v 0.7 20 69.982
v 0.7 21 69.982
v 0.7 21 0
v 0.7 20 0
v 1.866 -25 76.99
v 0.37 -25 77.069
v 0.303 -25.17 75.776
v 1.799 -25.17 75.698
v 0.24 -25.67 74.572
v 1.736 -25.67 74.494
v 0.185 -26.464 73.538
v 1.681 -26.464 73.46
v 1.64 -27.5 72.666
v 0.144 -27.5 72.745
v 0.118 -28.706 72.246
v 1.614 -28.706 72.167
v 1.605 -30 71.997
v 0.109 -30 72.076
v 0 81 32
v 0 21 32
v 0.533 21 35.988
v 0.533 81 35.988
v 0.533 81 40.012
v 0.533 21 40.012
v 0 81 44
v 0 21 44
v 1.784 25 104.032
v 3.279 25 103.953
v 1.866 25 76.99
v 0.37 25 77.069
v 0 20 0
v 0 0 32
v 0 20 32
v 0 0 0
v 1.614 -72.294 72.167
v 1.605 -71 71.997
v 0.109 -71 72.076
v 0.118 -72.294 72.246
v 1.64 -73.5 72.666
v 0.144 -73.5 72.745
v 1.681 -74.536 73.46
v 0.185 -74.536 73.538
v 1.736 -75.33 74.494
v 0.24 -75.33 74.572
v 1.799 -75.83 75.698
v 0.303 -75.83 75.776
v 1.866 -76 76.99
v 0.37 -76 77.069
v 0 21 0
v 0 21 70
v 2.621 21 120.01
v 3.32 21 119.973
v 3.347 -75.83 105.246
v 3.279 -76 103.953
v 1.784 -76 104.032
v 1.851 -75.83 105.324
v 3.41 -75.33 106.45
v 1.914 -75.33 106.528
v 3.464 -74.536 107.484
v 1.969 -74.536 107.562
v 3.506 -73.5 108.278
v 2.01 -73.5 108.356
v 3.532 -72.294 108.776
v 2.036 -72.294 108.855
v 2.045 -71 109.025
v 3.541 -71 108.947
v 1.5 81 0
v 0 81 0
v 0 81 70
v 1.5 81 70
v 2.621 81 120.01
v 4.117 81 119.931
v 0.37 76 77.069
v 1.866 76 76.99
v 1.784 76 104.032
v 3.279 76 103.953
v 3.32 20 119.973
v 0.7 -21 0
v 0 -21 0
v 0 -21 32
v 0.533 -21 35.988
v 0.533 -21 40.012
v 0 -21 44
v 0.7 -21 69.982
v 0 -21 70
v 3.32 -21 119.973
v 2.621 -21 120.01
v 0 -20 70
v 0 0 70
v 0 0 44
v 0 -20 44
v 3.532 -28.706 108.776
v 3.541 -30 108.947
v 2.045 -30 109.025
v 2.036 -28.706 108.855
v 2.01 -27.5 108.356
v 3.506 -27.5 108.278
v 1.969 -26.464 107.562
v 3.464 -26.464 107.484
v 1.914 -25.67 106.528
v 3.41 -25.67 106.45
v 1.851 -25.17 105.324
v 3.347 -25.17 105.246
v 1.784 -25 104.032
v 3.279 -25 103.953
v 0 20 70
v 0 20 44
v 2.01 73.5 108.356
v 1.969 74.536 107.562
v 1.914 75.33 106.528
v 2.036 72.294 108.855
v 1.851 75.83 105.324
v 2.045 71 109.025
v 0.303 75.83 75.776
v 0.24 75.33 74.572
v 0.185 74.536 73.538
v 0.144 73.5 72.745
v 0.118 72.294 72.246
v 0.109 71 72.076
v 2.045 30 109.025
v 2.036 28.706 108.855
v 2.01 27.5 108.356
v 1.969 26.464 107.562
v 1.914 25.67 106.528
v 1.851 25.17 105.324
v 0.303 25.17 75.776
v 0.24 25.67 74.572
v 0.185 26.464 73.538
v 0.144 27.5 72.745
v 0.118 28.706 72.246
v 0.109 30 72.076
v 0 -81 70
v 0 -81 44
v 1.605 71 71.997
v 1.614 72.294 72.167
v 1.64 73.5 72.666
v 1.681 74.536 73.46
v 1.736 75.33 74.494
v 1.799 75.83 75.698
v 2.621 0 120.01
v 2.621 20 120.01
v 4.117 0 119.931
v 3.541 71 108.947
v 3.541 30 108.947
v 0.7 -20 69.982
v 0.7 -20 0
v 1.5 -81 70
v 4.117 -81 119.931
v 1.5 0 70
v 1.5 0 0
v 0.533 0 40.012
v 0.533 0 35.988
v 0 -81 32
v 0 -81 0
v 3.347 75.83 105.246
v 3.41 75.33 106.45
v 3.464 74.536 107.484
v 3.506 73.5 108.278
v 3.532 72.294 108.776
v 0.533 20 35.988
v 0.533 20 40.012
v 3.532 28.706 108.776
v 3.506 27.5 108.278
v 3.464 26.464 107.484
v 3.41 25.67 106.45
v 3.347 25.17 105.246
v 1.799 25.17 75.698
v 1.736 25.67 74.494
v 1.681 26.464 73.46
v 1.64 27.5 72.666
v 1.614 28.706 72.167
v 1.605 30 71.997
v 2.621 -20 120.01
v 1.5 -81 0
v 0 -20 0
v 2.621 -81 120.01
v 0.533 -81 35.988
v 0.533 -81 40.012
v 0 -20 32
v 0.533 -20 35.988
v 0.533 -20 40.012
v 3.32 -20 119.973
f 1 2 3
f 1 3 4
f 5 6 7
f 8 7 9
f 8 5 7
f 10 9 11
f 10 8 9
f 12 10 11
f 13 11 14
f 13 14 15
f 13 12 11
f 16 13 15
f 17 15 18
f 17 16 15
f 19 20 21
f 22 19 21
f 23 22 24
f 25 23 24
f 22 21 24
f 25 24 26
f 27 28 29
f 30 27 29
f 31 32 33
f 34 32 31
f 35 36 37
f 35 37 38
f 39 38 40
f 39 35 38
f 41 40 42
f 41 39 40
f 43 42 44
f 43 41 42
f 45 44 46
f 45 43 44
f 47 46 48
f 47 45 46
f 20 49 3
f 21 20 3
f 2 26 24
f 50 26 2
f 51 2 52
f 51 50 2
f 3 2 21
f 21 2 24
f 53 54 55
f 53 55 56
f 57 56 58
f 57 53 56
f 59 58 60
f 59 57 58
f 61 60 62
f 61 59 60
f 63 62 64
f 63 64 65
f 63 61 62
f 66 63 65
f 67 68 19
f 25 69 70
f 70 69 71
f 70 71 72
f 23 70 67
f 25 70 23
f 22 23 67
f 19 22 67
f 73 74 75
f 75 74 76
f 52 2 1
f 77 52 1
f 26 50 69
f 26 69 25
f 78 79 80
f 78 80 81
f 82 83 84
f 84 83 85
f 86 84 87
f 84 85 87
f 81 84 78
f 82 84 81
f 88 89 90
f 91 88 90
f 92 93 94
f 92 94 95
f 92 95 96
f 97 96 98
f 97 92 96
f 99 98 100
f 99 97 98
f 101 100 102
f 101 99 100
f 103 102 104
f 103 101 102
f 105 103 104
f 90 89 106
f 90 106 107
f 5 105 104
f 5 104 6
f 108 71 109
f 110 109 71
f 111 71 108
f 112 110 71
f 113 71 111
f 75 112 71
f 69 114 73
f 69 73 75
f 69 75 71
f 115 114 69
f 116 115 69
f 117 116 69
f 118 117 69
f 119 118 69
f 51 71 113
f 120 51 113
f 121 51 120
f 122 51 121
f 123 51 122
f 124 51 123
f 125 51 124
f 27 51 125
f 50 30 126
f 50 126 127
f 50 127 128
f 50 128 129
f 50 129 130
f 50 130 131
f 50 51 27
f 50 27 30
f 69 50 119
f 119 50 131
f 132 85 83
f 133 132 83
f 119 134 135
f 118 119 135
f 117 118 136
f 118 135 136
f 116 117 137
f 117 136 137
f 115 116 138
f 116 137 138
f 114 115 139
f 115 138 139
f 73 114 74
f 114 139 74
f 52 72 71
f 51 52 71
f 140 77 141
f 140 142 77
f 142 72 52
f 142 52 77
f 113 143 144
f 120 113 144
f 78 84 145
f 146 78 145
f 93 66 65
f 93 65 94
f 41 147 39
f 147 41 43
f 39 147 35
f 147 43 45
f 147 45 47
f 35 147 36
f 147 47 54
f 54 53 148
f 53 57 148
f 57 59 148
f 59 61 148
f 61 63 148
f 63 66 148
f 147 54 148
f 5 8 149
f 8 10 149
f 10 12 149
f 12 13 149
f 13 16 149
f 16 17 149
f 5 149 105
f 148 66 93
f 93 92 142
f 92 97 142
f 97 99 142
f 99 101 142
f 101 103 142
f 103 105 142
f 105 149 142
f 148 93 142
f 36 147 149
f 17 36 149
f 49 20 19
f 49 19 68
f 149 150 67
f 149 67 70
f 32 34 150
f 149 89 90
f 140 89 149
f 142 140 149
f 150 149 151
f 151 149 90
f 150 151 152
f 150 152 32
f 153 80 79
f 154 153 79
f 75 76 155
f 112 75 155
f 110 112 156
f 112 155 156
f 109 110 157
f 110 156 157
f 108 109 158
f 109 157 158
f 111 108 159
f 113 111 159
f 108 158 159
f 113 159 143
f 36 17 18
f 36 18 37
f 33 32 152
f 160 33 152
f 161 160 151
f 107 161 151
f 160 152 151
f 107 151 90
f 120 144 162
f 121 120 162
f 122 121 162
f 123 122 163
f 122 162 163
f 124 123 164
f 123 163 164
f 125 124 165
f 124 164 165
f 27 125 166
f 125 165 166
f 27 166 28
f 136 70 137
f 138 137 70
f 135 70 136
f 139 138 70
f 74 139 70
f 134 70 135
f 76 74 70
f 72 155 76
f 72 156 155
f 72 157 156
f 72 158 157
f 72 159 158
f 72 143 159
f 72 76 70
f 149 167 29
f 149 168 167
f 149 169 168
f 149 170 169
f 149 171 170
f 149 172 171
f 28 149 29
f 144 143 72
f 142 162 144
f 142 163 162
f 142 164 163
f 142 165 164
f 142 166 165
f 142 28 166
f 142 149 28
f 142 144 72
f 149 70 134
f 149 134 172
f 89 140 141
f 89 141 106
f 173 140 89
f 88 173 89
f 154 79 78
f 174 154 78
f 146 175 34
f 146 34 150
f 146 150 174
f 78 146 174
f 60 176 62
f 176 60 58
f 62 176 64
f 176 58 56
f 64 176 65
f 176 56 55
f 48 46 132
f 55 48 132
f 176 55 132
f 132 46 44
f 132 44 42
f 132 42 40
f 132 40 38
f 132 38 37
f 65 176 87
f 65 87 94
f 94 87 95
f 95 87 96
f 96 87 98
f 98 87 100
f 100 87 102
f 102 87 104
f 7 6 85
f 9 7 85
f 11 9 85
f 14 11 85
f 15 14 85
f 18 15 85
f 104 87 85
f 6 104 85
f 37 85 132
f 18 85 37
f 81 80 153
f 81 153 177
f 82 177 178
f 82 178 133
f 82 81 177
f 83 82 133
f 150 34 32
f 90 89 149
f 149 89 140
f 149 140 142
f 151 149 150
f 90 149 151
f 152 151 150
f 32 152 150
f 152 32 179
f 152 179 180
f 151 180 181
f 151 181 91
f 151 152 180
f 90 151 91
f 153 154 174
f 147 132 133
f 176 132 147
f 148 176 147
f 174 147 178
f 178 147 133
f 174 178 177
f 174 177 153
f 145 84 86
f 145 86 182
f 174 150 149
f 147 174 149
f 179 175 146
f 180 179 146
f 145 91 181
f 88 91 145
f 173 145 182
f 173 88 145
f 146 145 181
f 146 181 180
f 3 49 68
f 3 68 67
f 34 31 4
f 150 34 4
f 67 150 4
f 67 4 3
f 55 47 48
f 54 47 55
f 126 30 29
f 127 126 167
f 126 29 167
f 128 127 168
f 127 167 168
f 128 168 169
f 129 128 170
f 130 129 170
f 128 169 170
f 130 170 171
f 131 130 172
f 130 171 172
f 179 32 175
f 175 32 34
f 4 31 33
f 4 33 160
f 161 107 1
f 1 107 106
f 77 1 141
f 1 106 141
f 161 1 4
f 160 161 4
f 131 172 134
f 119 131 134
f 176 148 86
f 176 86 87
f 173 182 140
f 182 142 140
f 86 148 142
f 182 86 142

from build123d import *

# Parameters (mm, degrees)
F1_DEPTH = 81
F3_DEPTH = 4.1162588316
F5_DEPTH = 81.001
F6_W     = 1
F6_H     = 70
F7_DEPTH = 0.7
F8_W     = 1
F8_H     = 50.0785039344
F9_DEPTH = 0.7


with BuildPart() as f1:
    # F0 (on Front) → F1 (new body)
    with BuildSketch(Plane.XZ):
        Polygon((0, 70), (0, 0), (1.5, 0), (1.5, 70), (4.1167978121, 119.9314767377), (2.6209063906, 120.0098730852), align=None)
    extrude(amount=-F1_DEPTH)

    # F2 (on face) → F3 (cut, through all)
    with BuildSketch(Plane(origin=(-2.1626047928, 0, 0.1133373147), x_dir=(0, 1, 0), z_dir=(0.9986295348, 0, -0.0523359562))):
        with BuildLine():
            Line((71, 108.9825713672), (30, 108.9825713672))
            ThreePointArc((30, 108.9825713672), (26.4644660941, 107.5181052731), (25, 103.9825713672))
            Line((25, 103.9825713672), (25, 76.9825713672))
            ThreePointArc((25, 76.9825713672), (26.4644660941, 73.4470374613), (30, 71.9825713672))
            Line((30, 71.9825713672), (71, 71.9825713672))
            ThreePointArc((71, 71.9825713672), (74.5355339059, 73.4470374613), (76, 76.9825713672))
            Line((76, 76.9825713672), (76, 103.9825713672))
            ThreePointArc((76, 103.9825713672), (74.5355339059, 107.5181052731), (71, 108.9825713672))
        make_face()
    extrude(amount=-F3_DEPTH, mode=Mode.SUBTRACT)

    # F4 (on face) → F5 (cut, through all)
    with BuildSketch(Plane.XZ):
        with BuildLine():
            ThreePointArc((0, 32), (0.6, 38), (0, 44))
            Line((0, 44), (0, 32))
        make_face()
    extrude(amount=-F5_DEPTH, mode=Mode.SUBTRACT)

    # F6 (on face) → F7 (cut)
    with BuildSketch(Plane(origin=(0, 0, 0), x_dir=(0, -1, 0), z_dir=(-1, 0, 0))):
        with Locations((-20.5, 35)):
            Rectangle(F6_W, F6_H)
    extrude(amount=-F7_DEPTH, mode=Mode.SUBTRACT)

    # F8 (on face) → F9 (cut)
    with BuildSketch(Plane(origin=(-3.6584962144, 0, 0.1917336621), x_dir=(0, -1, 0), z_dir=(-0.9986295348, 0, 0.0523359562))):
        with Locations((-20.5, 94.9433194)):
            Rectangle(F8_W, F8_H)
    extrude(amount=-F9_DEPTH, mode=Mode.SUBTRACT)


with BuildPart() as f10_1:
    # F10: instance of F1
    add(f1.part.mirror(Plane.XZ))


solid = Compound([f1.part, f10_1.part])
